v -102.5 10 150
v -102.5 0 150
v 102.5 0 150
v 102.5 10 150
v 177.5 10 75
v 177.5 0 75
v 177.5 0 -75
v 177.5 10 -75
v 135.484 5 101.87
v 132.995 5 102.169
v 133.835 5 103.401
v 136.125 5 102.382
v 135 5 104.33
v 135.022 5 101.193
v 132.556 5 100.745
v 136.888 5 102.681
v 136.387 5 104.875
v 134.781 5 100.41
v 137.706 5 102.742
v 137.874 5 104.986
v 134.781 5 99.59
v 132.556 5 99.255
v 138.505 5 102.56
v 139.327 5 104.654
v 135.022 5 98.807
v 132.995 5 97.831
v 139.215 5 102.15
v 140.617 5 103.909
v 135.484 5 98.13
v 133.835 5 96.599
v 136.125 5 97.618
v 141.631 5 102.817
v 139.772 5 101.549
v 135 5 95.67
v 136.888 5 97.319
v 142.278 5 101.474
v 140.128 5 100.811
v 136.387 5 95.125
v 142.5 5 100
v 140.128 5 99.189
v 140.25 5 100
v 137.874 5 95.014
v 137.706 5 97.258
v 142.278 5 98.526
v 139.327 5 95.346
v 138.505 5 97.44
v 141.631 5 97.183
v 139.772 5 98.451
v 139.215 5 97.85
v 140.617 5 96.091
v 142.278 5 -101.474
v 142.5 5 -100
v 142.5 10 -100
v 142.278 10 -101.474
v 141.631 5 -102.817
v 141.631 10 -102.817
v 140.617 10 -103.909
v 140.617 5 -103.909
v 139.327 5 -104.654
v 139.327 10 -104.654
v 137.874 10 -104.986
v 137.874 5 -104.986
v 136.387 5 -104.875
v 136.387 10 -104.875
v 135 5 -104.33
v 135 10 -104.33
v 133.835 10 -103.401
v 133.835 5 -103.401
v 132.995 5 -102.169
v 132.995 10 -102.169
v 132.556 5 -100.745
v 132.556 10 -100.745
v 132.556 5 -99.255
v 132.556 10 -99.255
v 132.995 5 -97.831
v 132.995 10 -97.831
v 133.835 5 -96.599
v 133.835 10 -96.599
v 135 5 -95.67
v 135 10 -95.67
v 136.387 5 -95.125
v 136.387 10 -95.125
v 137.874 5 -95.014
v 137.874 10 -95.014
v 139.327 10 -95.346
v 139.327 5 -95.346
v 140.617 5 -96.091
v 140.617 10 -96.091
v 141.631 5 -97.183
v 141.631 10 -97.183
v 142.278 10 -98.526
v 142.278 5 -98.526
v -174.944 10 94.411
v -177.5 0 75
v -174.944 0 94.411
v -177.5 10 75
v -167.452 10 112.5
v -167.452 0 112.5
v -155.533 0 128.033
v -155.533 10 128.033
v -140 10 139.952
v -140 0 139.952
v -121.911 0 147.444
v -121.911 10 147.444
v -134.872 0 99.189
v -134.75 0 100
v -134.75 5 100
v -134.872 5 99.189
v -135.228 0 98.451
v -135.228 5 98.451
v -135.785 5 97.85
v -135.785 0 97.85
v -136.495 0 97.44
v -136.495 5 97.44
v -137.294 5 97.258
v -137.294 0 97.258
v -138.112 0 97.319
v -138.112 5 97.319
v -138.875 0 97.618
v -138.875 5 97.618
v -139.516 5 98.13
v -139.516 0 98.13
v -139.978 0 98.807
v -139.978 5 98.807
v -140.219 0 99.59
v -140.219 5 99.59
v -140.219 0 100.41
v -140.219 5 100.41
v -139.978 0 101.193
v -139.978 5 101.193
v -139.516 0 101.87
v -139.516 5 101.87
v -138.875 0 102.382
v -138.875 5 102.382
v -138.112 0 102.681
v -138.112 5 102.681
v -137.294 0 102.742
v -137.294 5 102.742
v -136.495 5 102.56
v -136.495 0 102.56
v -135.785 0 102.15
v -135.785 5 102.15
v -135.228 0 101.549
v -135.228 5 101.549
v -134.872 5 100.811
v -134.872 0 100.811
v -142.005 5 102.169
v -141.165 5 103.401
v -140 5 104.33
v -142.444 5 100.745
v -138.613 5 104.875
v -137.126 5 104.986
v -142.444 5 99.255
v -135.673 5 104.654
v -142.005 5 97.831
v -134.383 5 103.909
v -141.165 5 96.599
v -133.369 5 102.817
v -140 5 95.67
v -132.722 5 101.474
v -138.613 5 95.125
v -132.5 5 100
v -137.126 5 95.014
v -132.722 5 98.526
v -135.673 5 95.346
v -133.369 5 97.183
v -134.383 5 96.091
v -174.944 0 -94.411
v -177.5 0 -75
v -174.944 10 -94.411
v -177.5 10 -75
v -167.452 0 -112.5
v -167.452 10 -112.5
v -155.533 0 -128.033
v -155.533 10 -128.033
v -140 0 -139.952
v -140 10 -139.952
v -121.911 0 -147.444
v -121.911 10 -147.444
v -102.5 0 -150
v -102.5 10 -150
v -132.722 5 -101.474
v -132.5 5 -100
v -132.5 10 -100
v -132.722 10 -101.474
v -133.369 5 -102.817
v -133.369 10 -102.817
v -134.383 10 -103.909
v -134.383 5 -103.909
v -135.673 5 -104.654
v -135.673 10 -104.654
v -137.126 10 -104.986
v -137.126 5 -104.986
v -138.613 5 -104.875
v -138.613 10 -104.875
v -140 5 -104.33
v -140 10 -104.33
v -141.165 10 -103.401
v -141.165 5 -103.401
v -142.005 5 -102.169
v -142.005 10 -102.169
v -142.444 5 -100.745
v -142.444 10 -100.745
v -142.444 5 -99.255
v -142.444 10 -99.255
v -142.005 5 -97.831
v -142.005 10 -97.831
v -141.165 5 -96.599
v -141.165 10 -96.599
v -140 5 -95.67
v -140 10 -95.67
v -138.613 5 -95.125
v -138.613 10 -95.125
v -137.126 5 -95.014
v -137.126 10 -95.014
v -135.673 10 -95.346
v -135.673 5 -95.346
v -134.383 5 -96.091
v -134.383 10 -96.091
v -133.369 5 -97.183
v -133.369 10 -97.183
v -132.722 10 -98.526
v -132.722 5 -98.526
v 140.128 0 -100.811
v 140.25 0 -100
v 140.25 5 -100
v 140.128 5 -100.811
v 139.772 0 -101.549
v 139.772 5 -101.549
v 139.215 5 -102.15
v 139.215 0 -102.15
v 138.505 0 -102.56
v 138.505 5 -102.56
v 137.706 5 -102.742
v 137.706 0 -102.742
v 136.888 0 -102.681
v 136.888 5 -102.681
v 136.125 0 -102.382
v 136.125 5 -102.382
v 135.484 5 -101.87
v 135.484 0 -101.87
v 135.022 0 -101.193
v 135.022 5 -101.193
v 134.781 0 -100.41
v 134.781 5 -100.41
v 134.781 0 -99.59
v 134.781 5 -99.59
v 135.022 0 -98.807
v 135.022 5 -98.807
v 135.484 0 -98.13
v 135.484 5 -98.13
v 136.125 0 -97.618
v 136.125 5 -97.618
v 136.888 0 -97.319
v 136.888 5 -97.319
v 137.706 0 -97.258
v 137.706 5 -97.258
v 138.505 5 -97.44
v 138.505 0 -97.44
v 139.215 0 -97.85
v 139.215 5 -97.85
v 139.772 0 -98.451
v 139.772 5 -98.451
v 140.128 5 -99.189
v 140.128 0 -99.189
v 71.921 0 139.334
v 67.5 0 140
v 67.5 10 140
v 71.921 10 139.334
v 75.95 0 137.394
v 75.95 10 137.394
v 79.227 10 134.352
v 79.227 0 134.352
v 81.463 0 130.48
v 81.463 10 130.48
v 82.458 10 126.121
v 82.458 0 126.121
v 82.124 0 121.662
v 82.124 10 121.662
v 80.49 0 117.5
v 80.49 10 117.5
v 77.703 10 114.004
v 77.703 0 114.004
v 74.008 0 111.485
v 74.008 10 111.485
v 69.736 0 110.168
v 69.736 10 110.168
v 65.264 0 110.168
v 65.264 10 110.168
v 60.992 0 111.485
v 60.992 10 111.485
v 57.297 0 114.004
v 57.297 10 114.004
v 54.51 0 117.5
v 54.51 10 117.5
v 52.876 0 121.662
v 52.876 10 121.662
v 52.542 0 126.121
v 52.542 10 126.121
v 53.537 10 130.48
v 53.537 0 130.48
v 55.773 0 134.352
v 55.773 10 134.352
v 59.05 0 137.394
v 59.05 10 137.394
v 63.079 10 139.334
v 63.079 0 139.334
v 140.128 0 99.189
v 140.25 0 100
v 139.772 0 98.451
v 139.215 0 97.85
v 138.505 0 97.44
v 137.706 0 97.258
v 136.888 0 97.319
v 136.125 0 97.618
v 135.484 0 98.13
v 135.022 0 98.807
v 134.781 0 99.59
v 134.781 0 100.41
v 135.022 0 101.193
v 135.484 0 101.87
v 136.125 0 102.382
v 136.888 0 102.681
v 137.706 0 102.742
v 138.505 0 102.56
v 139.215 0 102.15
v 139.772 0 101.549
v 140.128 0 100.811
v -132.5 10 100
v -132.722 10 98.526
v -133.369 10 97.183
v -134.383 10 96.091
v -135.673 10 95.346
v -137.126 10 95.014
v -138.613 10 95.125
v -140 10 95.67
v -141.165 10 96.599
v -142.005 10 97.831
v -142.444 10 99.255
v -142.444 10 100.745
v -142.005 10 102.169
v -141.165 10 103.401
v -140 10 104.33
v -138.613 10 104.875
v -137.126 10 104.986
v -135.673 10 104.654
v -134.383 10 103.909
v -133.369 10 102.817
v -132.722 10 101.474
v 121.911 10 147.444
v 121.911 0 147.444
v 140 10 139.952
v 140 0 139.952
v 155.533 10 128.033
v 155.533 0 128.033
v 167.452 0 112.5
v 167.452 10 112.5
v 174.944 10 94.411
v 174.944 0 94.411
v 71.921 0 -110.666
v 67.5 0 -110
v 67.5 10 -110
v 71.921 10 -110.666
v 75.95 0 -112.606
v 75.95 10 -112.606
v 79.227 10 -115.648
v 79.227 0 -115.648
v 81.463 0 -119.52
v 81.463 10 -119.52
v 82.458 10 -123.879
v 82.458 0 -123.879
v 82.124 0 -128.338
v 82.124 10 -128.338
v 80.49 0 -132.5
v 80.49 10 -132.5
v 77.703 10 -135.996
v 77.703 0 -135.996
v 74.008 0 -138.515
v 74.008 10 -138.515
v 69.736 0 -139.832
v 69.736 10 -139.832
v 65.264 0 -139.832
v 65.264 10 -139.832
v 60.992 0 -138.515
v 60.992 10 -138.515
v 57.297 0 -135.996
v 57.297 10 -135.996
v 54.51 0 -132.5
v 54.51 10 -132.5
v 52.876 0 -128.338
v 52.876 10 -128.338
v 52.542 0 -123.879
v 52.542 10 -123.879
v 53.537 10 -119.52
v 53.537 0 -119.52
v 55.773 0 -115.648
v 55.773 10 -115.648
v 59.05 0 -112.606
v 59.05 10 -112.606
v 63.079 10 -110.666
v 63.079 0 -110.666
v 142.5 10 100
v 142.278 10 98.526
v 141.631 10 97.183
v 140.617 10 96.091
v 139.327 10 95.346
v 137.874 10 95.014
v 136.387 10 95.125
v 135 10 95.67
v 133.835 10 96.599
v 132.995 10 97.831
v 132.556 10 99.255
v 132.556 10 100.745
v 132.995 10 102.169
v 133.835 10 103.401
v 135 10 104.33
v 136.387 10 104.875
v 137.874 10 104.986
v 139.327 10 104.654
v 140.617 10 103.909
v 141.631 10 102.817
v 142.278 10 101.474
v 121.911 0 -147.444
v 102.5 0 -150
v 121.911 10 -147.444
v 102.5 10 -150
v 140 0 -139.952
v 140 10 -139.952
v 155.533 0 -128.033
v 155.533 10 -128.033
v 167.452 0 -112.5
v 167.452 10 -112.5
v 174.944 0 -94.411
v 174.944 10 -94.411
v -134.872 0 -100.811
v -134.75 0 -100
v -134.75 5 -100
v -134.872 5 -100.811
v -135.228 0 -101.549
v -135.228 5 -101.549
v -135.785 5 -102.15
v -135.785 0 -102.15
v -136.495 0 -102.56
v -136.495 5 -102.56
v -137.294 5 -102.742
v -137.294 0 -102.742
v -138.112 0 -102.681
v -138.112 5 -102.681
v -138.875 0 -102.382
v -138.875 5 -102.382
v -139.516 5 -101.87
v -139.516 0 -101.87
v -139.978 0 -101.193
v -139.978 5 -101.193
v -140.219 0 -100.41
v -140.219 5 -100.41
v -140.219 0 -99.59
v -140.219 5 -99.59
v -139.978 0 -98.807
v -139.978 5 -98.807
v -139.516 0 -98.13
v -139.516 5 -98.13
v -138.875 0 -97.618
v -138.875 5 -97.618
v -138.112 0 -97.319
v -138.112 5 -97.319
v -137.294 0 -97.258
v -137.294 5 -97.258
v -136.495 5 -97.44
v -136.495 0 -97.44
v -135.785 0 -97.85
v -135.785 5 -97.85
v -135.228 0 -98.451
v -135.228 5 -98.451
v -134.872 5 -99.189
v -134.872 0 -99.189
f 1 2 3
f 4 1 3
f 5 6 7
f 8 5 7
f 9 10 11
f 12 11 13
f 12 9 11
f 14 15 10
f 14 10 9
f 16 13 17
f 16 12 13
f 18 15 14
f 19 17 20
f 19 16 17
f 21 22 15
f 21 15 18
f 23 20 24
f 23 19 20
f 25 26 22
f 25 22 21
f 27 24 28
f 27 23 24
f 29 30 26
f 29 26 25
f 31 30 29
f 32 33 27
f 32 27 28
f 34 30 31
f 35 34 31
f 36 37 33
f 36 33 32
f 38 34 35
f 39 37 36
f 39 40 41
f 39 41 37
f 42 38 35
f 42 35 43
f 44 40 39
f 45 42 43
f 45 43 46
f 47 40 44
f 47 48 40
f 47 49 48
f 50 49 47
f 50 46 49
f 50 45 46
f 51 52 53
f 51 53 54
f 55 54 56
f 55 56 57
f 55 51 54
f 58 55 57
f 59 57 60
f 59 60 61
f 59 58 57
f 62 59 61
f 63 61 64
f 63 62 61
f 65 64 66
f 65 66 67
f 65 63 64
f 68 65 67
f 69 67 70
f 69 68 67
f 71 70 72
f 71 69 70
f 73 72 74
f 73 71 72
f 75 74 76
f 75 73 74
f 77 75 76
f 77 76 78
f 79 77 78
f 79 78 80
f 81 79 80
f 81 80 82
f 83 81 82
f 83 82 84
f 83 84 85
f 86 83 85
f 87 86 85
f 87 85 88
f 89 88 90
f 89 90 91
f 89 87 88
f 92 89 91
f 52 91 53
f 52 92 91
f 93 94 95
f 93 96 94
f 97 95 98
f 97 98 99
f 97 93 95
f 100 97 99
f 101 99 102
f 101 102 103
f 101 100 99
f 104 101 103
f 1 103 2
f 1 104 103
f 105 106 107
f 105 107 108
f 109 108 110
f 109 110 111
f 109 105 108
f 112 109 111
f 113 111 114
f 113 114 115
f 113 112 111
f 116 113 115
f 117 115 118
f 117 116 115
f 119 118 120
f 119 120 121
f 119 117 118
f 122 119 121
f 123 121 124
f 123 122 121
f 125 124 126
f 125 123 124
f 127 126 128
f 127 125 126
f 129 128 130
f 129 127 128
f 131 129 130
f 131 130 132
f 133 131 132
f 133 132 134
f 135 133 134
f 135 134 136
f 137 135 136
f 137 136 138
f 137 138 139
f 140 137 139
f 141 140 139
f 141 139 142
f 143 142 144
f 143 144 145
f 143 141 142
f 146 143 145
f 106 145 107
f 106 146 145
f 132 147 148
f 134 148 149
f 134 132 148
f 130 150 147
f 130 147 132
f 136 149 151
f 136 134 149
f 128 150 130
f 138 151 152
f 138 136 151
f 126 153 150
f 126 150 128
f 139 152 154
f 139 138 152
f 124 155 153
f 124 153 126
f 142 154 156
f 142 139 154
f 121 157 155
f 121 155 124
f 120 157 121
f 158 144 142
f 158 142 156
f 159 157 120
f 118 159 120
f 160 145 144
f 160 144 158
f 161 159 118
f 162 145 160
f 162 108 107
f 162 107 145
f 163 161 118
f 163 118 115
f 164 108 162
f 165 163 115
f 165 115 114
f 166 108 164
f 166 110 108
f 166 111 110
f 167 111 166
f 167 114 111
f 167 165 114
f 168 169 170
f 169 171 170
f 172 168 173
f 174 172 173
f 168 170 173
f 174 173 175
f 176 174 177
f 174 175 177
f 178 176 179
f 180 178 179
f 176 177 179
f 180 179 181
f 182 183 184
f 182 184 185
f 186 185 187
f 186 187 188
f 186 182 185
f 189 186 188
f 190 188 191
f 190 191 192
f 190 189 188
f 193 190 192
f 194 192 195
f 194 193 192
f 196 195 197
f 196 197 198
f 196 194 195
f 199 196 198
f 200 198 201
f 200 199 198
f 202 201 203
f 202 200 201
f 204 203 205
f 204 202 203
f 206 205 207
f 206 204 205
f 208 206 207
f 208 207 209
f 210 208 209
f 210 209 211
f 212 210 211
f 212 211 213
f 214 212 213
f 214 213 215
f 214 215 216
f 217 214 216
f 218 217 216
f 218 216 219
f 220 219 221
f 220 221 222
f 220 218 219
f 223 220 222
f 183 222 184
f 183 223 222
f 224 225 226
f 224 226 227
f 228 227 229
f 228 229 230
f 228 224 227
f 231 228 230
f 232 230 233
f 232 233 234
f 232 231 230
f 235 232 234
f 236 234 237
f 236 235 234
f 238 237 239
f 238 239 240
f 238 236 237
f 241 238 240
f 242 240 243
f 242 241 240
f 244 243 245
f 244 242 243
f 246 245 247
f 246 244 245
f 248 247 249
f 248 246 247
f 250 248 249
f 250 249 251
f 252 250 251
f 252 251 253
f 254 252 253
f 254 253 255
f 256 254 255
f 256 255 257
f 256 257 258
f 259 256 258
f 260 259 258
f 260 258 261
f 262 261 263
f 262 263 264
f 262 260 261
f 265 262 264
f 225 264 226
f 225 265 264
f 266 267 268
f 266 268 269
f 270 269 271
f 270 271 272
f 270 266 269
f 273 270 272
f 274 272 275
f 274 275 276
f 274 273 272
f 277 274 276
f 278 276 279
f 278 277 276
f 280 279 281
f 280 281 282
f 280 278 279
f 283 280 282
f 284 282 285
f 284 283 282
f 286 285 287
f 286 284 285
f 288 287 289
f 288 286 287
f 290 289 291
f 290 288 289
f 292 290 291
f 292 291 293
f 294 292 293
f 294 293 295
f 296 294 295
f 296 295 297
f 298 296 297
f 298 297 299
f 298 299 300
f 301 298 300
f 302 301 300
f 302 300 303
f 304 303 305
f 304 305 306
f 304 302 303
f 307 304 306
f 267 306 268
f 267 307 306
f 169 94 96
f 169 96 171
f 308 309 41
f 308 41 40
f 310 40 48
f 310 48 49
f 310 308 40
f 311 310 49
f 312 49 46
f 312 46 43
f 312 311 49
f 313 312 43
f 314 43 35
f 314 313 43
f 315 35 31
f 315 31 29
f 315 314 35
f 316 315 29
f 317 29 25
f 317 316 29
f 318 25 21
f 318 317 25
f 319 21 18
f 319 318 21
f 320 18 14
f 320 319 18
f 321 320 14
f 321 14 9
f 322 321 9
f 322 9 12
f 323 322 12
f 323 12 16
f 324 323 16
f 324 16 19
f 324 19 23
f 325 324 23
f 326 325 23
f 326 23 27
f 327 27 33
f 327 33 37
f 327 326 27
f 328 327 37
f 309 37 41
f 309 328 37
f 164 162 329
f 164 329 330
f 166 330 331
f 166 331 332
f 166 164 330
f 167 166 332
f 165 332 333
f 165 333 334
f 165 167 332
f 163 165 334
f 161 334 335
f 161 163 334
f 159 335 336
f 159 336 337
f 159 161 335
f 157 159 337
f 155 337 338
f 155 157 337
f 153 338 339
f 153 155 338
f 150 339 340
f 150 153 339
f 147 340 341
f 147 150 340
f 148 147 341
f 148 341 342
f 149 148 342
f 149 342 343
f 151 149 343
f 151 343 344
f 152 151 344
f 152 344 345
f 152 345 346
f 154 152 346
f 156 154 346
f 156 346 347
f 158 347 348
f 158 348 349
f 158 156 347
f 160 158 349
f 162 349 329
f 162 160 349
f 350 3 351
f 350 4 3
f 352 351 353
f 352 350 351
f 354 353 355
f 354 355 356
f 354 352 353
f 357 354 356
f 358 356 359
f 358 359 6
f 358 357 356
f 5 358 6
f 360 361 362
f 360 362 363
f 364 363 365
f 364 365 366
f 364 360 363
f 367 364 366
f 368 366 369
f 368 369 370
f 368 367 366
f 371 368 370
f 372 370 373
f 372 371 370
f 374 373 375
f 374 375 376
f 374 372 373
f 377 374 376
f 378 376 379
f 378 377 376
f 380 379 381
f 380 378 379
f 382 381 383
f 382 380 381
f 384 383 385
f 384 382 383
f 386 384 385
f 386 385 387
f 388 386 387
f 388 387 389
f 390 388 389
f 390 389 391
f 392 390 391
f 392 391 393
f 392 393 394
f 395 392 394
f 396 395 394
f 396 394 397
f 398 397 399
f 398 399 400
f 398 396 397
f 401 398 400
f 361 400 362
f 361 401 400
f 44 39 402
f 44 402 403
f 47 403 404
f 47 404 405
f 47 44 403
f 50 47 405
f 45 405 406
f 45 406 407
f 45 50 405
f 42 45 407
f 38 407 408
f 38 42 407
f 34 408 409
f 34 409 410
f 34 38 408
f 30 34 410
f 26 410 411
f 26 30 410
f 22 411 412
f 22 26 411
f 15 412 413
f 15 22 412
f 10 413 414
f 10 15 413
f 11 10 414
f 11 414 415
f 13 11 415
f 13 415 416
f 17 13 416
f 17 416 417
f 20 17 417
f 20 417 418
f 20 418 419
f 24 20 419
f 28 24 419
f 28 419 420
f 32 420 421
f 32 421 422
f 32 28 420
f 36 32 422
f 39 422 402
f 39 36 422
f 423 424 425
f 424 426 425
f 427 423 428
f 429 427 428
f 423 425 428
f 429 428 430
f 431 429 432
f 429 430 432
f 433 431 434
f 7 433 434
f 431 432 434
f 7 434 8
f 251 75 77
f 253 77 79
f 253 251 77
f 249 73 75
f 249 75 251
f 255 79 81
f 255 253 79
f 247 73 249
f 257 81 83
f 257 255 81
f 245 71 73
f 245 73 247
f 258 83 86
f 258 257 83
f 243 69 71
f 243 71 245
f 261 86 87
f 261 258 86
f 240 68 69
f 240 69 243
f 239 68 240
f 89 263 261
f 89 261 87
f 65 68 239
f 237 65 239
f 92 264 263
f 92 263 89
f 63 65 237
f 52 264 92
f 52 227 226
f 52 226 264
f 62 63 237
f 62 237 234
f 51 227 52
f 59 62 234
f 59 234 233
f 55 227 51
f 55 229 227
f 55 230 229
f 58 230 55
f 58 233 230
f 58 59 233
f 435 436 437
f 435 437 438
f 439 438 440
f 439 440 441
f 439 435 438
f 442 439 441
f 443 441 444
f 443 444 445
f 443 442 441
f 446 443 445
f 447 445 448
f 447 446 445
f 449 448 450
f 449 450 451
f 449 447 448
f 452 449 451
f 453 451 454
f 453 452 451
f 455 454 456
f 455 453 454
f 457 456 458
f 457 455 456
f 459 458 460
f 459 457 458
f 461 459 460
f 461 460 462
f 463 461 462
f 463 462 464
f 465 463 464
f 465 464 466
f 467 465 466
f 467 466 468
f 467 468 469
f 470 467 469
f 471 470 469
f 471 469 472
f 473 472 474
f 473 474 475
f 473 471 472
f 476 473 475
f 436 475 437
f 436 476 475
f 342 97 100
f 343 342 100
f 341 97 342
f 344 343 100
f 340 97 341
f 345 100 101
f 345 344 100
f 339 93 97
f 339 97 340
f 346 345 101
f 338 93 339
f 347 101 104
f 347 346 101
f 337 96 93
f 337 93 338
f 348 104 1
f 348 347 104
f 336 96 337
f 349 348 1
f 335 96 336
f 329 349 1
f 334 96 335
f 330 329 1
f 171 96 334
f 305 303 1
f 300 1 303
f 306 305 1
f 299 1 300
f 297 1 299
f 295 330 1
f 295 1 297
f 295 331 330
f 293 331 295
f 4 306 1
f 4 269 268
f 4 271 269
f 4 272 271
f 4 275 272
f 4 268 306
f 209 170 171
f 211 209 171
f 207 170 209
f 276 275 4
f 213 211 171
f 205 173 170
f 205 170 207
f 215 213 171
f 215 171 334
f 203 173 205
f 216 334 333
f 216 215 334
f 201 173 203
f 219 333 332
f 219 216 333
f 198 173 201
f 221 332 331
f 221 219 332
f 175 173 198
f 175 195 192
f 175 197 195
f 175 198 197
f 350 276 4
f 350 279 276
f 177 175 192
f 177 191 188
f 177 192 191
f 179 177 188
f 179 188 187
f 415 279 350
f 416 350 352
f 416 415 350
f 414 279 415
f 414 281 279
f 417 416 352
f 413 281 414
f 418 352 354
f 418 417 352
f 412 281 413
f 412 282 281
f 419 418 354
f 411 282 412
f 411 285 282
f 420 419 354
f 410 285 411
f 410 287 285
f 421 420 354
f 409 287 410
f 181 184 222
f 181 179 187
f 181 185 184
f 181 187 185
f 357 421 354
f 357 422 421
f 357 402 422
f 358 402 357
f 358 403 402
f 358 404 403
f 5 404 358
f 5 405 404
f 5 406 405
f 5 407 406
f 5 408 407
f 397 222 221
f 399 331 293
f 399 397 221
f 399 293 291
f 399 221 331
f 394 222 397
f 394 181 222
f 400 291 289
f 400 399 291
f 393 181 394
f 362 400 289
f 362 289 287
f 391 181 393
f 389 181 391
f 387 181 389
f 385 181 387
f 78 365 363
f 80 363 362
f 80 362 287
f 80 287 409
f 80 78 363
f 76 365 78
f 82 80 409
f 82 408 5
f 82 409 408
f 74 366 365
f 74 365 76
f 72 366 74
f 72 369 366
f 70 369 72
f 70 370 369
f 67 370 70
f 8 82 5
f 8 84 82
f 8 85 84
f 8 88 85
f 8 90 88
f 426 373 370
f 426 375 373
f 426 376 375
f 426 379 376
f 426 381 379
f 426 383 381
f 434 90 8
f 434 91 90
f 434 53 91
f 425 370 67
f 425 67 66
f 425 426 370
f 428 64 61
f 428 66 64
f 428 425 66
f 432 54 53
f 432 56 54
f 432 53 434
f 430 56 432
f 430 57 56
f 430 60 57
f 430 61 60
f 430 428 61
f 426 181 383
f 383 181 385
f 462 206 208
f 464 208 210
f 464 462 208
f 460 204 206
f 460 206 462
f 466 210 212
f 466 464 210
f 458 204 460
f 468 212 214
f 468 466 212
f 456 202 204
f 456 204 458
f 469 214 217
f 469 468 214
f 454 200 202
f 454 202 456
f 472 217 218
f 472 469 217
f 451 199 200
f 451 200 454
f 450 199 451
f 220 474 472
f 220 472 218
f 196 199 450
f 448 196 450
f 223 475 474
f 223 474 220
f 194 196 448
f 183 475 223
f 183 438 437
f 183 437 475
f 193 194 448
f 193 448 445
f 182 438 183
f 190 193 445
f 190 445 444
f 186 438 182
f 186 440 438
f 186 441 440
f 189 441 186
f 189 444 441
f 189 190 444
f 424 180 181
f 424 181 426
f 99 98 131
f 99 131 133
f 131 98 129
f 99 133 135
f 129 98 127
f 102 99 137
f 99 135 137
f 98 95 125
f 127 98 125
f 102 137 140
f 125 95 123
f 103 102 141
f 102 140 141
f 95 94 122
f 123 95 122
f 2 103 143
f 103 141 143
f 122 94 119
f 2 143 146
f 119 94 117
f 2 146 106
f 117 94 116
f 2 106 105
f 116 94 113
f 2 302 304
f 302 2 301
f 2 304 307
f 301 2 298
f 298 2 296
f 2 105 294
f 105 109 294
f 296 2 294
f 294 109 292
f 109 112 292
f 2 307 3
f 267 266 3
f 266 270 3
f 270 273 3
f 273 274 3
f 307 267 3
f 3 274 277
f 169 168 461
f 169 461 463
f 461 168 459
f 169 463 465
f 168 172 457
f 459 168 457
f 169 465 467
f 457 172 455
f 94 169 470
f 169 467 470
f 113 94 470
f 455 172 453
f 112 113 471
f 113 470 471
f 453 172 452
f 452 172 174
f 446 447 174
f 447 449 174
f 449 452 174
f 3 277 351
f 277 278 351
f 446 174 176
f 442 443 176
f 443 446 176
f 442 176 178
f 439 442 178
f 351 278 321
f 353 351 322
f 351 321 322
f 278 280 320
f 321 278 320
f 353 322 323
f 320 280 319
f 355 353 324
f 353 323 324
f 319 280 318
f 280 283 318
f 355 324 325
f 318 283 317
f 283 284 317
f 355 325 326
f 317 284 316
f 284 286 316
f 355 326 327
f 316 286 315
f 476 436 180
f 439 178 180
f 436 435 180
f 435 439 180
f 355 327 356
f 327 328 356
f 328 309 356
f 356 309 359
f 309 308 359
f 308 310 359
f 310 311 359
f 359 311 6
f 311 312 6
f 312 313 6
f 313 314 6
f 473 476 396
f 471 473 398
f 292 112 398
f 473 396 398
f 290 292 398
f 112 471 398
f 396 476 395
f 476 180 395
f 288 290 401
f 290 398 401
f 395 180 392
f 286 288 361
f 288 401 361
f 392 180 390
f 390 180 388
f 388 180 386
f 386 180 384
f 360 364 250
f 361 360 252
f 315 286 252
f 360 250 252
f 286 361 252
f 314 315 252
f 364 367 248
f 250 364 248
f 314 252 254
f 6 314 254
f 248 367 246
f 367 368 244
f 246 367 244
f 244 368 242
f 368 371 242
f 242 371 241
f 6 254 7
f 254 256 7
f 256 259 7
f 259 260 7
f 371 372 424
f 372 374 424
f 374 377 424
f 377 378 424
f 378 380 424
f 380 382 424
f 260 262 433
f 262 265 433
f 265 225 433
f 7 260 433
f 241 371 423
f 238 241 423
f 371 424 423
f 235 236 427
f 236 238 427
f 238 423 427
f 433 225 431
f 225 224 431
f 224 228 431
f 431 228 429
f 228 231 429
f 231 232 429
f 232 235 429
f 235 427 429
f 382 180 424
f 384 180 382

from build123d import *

# Parameters (mm, degrees)
SKETCH11_W                     = 355
SKETCH11_H                     = 300
SKETCH11_R                     = 15
BOSS_EXTRUDE2_DEPTH            = 10
CBORE_START                    = 5
CBORE_FOR_M5_SHCS1_OUTLINE_R   = 5
CBORE_FOR_M5_SHCS1_DEPTH       = 5
CBORE_FOR_M5_SHCS1_2_OUTLINE_R = 2.75
CBORE_FOR_M5_SHCS1_2_DEPTH     = 5
FILLET1_R                      = 75


# Read off the part's stored shape, not the designer's step: CBORE for M5 SHCS1
with BuildPart() as part:
    # Sketch11 → Boss-Extrude2 (new body)
    with BuildSketch(Plane(origin=(0, 0, 0), x_dir=(1, 0, 0), z_dir=(0, 1, 0))):
        Rectangle(SKETCH11_W, SKETCH11_H)
        with Locations(Location((67.5, -125, 0), (0, 0, 270))):
            Circle(SKETCH11_R, mode=Mode.SUBTRACT)
        with Locations(Location((67.5, 125, 0), (0, 0, 270))):
            Circle(SKETCH11_R, mode=Mode.SUBTRACT)
    extrude(amount=BOSS_EXTRUDE2_DEPTH)

    # CBORE for M5 SHCS1 outline → CBORE for M5 SHCS1 (cut)
    with BuildSketch(Plane(origin=(0, 0, 0), x_dir=(1, 0, 0), z_dir=(0, 1, 0)).offset(CBORE_START)):
        with Locations((137.5, 100)):
            Circle(CBORE_FOR_M5_SHCS1_OUTLINE_R)
        with Locations((-137.5, -100)):
            Circle(CBORE_FOR_M5_SHCS1_OUTLINE_R)
        with Locations((-137.5, 100)):
            Circle(CBORE_FOR_M5_SHCS1_OUTLINE_R)
        with Locations((137.5, -100)):
            Circle(CBORE_FOR_M5_SHCS1_OUTLINE_R)
    extrude(amount=CBORE_FOR_M5_SHCS1_DEPTH, mode=Mode.SUBTRACT)

    # CBORE for M5 SHCS1 2 outline → CBORE for M5 SHCS1 2 (cut)
    with BuildSketch(Plane(origin=(0, 0, 0), x_dir=(1, 0, 0), z_dir=(0, 1, 0))):
        with Locations((137.5, 100)):
            Circle(CBORE_FOR_M5_SHCS1_2_OUTLINE_R)
        with Locations((-137.5, -100)):
            Circle(CBORE_FOR_M5_SHCS1_2_OUTLINE_R)
        with Locations((-137.5, 100)):
            Circle(CBORE_FOR_M5_SHCS1_2_OUTLINE_R)
        with Locations((137.5, -100)):
            Circle(CBORE_FOR_M5_SHCS1_2_OUTLINE_R)
    extrude(amount=CBORE_FOR_M5_SHCS1_2_DEPTH, mode=Mode.SUBTRACT)

    # Fillet1
    fillet1_edges = [part.edges().sort_by_distance(p)[0] for p in [
        (177.5, 5, -150),
        (177.5, 5, 150),
        (-177.5, 5, 150),
        (-177.5, 5, -150),
    ]]
    fillet(fillet1_edges, radius=FILLET1_R)


solid = part.part
